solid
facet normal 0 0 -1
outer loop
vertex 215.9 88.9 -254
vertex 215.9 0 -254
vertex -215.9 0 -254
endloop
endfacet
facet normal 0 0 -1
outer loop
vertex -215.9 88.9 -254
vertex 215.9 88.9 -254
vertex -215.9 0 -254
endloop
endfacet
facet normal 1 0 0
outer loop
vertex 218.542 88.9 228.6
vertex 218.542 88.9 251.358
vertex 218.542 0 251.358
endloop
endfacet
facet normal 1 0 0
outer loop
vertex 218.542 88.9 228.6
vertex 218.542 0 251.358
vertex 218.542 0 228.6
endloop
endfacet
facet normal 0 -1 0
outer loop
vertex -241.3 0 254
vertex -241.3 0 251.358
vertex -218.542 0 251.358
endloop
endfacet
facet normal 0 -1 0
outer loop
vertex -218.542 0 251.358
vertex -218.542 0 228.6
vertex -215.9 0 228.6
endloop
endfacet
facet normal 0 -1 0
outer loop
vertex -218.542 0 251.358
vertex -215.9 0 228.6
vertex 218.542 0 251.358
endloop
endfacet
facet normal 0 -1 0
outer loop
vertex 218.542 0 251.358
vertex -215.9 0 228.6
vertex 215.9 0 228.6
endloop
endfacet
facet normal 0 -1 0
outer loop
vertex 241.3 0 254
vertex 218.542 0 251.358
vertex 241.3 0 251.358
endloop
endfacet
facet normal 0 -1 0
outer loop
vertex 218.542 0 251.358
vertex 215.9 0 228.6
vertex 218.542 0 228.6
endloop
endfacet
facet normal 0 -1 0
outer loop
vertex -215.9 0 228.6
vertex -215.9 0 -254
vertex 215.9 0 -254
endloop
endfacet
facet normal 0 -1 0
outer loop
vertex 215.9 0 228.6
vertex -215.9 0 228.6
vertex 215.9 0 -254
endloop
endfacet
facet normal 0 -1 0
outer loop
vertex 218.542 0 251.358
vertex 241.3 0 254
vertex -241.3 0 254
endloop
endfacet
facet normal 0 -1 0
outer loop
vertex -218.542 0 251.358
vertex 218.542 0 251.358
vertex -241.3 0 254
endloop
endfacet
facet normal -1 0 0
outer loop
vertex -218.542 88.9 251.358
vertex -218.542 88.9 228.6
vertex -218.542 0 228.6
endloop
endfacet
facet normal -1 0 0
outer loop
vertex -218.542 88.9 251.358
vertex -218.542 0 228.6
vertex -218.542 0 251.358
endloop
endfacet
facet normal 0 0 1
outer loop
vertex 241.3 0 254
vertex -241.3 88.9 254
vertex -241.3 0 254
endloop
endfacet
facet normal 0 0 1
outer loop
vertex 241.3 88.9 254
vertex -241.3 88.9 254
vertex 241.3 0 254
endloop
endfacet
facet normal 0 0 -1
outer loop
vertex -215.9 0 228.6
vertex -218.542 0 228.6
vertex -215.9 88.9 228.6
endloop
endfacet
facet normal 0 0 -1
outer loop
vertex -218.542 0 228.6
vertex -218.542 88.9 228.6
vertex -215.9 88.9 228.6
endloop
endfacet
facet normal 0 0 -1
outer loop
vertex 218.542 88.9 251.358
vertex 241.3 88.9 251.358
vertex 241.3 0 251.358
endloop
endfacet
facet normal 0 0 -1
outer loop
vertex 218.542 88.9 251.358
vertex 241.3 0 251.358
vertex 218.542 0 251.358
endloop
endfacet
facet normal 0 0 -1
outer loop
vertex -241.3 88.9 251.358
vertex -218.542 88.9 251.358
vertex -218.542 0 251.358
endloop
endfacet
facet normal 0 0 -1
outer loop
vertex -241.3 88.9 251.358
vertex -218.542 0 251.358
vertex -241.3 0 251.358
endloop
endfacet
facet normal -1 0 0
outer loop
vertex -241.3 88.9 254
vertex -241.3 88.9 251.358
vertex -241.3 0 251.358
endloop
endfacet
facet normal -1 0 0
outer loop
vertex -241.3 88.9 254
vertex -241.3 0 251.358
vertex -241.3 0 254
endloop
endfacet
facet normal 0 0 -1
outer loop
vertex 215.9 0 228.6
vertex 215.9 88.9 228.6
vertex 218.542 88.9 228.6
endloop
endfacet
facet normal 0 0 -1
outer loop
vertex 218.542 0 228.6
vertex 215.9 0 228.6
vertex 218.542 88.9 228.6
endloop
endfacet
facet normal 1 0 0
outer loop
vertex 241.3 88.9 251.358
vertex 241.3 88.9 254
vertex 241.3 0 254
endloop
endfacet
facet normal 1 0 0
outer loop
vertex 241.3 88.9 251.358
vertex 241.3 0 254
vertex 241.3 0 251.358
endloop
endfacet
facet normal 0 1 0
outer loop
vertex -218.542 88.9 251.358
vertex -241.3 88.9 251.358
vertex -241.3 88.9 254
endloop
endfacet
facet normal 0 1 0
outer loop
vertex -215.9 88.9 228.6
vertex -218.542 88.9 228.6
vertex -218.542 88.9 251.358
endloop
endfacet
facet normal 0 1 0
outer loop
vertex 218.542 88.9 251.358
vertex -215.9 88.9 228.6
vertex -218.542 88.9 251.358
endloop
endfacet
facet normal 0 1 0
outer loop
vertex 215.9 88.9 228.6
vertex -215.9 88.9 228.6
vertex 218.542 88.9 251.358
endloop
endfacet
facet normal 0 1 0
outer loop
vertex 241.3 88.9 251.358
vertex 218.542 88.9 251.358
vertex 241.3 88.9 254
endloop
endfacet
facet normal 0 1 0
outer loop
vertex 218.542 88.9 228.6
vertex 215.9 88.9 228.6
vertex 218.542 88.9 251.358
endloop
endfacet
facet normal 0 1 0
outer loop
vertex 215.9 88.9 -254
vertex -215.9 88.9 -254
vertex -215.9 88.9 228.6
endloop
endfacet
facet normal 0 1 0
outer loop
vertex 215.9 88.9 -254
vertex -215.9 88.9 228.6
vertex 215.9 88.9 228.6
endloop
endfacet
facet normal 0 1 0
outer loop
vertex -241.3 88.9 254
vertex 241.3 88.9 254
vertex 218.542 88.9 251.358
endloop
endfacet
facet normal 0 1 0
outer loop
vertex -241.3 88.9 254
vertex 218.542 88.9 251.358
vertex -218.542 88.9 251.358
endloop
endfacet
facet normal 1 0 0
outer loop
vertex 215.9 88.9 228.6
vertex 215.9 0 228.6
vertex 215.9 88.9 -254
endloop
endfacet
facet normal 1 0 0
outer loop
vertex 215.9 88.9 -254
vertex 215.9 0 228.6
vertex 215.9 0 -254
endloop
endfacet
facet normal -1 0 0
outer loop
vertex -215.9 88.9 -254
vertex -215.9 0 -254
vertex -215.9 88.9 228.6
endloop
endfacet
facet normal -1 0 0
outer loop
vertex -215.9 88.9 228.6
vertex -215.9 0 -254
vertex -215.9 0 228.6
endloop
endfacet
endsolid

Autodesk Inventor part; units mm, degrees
ref_plane "YZ Plane" through (0, 0, 0) normal (1, 0, 0) x (0, 1, 0)
ref_plane "XZ Plane" through (0, 0, 0) normal (0, 1, 0) x (-1, 0, 0)
ref_plane "XY Plane" through (0, 0, 0) normal (0, 0, 1) x (1, 0, 0)
sketch "Sketch2" plane through (0, 0, 0) normal (0, 1, 0) x (-1, 0, 0)
  line L0 (215.9, 254) -> (-215.9, 254)
  line L1 (-215.9, 254) -> (-215.9, -254)
  line L2 (-215.9, -254) -> (215.9, -254)
  line L3 (215.9, -254) -> (215.9, 254)
  line L4 (215.9, 254) -> (-215.9, -254) construction
  line L5 (-215.9, 254) -> (215.9, -254) construction
  point P0 (0, 0)
  point P1 (0, -254)
  dimension "d6" = 431.8
  dimension "d7" = 508
extrude "Extrusion3" add sketch "Sketch2" along normal blind 88.9
ref_plane "Work Plane3" through (0, 88.9, 254) normal (1, 0, 0) x (0, 1, 0)
sketch "Sketch4" plane through (0, 88.9, 0) normal (0, 1, 0) x (1, 0, 0)
  line L0 (-215.9, -254) -> (215.9, -254) projected
  line L1 (215.9, -228.6) -> (215.9, -254)
  line L2 (215.9, -254) -> (241.3, -254)
  line L3 (241.3, -251.3584) -> (218.5416, -251.3584)
  line L4 (218.5416, -251.3584) -> (218.5416, -228.6)
  line L5 (215.9, -228.6) -> (218.5416, -228.6)
  line L6 (215.9, -254) -> (215.9, 254) projected
  line L7 (241.3, -254) -> (241.3, -251.3584)
  point P0 (0, 0)
  dimension "d13" = 25.4
  dimension "d14" = 25.4
  dimension "d15" = 2.6416
extrude "Extrusion5" add sketch "Sketch4" against normal blind 88.9
mirror "Mirror1" about plane through (0, 88.9, 254) normal (1, 0, 0) of "Extrusion5"
equation "\"BendRadius\" = Thickness"
equation "\"BendReliefWidth\" = Thickness"
equation "\"BendReliefDepth\" = 0.5 * Thickness"
equation "\"CornerReliefSize\" = 4 * Thickness"
equation "\"MinimumRemnant\" = 2 * Thickness"
equation "\"TransitionRadius\" = BendRadius"
equation "\"JacobiRadiusSize\" = Thickness"
equation "\"GapSize\" = Thickness"
equation "\"Thickness\" = 3.048"
properties part number "acPower"
